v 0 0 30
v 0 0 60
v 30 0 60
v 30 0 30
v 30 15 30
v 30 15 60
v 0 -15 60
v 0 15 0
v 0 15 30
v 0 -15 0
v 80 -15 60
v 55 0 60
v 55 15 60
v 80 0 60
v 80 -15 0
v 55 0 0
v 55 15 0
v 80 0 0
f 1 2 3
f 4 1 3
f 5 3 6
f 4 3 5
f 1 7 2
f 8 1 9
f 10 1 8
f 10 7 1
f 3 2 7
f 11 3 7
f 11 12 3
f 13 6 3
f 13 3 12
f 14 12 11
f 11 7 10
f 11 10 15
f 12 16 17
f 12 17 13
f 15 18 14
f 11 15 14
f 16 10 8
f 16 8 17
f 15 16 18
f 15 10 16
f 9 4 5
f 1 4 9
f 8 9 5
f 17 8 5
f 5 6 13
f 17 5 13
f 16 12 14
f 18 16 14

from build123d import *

# Parameters (mm, degrees)
F0_W     = 80
F0_H     = 60
F1_DEPTH = 15
F3_DEPTH = 15


with BuildPart() as f1:
    # F0 (on Front) → F1 (new body)
    with BuildSketch(Plane.XZ):
        with Locations((40, 30)):
            Rectangle(F0_W, F0_H)
    extrude(amount=F1_DEPTH)

    # F2 (on Front) → F3 (join)
    with BuildSketch(Plane.XZ):
        Polygon((0, 30), (0, 0), (55, 0), (55, 60), (30, 60), (30, 30), align=None)
    extrude(amount=-F3_DEPTH)


solid = f1.part
